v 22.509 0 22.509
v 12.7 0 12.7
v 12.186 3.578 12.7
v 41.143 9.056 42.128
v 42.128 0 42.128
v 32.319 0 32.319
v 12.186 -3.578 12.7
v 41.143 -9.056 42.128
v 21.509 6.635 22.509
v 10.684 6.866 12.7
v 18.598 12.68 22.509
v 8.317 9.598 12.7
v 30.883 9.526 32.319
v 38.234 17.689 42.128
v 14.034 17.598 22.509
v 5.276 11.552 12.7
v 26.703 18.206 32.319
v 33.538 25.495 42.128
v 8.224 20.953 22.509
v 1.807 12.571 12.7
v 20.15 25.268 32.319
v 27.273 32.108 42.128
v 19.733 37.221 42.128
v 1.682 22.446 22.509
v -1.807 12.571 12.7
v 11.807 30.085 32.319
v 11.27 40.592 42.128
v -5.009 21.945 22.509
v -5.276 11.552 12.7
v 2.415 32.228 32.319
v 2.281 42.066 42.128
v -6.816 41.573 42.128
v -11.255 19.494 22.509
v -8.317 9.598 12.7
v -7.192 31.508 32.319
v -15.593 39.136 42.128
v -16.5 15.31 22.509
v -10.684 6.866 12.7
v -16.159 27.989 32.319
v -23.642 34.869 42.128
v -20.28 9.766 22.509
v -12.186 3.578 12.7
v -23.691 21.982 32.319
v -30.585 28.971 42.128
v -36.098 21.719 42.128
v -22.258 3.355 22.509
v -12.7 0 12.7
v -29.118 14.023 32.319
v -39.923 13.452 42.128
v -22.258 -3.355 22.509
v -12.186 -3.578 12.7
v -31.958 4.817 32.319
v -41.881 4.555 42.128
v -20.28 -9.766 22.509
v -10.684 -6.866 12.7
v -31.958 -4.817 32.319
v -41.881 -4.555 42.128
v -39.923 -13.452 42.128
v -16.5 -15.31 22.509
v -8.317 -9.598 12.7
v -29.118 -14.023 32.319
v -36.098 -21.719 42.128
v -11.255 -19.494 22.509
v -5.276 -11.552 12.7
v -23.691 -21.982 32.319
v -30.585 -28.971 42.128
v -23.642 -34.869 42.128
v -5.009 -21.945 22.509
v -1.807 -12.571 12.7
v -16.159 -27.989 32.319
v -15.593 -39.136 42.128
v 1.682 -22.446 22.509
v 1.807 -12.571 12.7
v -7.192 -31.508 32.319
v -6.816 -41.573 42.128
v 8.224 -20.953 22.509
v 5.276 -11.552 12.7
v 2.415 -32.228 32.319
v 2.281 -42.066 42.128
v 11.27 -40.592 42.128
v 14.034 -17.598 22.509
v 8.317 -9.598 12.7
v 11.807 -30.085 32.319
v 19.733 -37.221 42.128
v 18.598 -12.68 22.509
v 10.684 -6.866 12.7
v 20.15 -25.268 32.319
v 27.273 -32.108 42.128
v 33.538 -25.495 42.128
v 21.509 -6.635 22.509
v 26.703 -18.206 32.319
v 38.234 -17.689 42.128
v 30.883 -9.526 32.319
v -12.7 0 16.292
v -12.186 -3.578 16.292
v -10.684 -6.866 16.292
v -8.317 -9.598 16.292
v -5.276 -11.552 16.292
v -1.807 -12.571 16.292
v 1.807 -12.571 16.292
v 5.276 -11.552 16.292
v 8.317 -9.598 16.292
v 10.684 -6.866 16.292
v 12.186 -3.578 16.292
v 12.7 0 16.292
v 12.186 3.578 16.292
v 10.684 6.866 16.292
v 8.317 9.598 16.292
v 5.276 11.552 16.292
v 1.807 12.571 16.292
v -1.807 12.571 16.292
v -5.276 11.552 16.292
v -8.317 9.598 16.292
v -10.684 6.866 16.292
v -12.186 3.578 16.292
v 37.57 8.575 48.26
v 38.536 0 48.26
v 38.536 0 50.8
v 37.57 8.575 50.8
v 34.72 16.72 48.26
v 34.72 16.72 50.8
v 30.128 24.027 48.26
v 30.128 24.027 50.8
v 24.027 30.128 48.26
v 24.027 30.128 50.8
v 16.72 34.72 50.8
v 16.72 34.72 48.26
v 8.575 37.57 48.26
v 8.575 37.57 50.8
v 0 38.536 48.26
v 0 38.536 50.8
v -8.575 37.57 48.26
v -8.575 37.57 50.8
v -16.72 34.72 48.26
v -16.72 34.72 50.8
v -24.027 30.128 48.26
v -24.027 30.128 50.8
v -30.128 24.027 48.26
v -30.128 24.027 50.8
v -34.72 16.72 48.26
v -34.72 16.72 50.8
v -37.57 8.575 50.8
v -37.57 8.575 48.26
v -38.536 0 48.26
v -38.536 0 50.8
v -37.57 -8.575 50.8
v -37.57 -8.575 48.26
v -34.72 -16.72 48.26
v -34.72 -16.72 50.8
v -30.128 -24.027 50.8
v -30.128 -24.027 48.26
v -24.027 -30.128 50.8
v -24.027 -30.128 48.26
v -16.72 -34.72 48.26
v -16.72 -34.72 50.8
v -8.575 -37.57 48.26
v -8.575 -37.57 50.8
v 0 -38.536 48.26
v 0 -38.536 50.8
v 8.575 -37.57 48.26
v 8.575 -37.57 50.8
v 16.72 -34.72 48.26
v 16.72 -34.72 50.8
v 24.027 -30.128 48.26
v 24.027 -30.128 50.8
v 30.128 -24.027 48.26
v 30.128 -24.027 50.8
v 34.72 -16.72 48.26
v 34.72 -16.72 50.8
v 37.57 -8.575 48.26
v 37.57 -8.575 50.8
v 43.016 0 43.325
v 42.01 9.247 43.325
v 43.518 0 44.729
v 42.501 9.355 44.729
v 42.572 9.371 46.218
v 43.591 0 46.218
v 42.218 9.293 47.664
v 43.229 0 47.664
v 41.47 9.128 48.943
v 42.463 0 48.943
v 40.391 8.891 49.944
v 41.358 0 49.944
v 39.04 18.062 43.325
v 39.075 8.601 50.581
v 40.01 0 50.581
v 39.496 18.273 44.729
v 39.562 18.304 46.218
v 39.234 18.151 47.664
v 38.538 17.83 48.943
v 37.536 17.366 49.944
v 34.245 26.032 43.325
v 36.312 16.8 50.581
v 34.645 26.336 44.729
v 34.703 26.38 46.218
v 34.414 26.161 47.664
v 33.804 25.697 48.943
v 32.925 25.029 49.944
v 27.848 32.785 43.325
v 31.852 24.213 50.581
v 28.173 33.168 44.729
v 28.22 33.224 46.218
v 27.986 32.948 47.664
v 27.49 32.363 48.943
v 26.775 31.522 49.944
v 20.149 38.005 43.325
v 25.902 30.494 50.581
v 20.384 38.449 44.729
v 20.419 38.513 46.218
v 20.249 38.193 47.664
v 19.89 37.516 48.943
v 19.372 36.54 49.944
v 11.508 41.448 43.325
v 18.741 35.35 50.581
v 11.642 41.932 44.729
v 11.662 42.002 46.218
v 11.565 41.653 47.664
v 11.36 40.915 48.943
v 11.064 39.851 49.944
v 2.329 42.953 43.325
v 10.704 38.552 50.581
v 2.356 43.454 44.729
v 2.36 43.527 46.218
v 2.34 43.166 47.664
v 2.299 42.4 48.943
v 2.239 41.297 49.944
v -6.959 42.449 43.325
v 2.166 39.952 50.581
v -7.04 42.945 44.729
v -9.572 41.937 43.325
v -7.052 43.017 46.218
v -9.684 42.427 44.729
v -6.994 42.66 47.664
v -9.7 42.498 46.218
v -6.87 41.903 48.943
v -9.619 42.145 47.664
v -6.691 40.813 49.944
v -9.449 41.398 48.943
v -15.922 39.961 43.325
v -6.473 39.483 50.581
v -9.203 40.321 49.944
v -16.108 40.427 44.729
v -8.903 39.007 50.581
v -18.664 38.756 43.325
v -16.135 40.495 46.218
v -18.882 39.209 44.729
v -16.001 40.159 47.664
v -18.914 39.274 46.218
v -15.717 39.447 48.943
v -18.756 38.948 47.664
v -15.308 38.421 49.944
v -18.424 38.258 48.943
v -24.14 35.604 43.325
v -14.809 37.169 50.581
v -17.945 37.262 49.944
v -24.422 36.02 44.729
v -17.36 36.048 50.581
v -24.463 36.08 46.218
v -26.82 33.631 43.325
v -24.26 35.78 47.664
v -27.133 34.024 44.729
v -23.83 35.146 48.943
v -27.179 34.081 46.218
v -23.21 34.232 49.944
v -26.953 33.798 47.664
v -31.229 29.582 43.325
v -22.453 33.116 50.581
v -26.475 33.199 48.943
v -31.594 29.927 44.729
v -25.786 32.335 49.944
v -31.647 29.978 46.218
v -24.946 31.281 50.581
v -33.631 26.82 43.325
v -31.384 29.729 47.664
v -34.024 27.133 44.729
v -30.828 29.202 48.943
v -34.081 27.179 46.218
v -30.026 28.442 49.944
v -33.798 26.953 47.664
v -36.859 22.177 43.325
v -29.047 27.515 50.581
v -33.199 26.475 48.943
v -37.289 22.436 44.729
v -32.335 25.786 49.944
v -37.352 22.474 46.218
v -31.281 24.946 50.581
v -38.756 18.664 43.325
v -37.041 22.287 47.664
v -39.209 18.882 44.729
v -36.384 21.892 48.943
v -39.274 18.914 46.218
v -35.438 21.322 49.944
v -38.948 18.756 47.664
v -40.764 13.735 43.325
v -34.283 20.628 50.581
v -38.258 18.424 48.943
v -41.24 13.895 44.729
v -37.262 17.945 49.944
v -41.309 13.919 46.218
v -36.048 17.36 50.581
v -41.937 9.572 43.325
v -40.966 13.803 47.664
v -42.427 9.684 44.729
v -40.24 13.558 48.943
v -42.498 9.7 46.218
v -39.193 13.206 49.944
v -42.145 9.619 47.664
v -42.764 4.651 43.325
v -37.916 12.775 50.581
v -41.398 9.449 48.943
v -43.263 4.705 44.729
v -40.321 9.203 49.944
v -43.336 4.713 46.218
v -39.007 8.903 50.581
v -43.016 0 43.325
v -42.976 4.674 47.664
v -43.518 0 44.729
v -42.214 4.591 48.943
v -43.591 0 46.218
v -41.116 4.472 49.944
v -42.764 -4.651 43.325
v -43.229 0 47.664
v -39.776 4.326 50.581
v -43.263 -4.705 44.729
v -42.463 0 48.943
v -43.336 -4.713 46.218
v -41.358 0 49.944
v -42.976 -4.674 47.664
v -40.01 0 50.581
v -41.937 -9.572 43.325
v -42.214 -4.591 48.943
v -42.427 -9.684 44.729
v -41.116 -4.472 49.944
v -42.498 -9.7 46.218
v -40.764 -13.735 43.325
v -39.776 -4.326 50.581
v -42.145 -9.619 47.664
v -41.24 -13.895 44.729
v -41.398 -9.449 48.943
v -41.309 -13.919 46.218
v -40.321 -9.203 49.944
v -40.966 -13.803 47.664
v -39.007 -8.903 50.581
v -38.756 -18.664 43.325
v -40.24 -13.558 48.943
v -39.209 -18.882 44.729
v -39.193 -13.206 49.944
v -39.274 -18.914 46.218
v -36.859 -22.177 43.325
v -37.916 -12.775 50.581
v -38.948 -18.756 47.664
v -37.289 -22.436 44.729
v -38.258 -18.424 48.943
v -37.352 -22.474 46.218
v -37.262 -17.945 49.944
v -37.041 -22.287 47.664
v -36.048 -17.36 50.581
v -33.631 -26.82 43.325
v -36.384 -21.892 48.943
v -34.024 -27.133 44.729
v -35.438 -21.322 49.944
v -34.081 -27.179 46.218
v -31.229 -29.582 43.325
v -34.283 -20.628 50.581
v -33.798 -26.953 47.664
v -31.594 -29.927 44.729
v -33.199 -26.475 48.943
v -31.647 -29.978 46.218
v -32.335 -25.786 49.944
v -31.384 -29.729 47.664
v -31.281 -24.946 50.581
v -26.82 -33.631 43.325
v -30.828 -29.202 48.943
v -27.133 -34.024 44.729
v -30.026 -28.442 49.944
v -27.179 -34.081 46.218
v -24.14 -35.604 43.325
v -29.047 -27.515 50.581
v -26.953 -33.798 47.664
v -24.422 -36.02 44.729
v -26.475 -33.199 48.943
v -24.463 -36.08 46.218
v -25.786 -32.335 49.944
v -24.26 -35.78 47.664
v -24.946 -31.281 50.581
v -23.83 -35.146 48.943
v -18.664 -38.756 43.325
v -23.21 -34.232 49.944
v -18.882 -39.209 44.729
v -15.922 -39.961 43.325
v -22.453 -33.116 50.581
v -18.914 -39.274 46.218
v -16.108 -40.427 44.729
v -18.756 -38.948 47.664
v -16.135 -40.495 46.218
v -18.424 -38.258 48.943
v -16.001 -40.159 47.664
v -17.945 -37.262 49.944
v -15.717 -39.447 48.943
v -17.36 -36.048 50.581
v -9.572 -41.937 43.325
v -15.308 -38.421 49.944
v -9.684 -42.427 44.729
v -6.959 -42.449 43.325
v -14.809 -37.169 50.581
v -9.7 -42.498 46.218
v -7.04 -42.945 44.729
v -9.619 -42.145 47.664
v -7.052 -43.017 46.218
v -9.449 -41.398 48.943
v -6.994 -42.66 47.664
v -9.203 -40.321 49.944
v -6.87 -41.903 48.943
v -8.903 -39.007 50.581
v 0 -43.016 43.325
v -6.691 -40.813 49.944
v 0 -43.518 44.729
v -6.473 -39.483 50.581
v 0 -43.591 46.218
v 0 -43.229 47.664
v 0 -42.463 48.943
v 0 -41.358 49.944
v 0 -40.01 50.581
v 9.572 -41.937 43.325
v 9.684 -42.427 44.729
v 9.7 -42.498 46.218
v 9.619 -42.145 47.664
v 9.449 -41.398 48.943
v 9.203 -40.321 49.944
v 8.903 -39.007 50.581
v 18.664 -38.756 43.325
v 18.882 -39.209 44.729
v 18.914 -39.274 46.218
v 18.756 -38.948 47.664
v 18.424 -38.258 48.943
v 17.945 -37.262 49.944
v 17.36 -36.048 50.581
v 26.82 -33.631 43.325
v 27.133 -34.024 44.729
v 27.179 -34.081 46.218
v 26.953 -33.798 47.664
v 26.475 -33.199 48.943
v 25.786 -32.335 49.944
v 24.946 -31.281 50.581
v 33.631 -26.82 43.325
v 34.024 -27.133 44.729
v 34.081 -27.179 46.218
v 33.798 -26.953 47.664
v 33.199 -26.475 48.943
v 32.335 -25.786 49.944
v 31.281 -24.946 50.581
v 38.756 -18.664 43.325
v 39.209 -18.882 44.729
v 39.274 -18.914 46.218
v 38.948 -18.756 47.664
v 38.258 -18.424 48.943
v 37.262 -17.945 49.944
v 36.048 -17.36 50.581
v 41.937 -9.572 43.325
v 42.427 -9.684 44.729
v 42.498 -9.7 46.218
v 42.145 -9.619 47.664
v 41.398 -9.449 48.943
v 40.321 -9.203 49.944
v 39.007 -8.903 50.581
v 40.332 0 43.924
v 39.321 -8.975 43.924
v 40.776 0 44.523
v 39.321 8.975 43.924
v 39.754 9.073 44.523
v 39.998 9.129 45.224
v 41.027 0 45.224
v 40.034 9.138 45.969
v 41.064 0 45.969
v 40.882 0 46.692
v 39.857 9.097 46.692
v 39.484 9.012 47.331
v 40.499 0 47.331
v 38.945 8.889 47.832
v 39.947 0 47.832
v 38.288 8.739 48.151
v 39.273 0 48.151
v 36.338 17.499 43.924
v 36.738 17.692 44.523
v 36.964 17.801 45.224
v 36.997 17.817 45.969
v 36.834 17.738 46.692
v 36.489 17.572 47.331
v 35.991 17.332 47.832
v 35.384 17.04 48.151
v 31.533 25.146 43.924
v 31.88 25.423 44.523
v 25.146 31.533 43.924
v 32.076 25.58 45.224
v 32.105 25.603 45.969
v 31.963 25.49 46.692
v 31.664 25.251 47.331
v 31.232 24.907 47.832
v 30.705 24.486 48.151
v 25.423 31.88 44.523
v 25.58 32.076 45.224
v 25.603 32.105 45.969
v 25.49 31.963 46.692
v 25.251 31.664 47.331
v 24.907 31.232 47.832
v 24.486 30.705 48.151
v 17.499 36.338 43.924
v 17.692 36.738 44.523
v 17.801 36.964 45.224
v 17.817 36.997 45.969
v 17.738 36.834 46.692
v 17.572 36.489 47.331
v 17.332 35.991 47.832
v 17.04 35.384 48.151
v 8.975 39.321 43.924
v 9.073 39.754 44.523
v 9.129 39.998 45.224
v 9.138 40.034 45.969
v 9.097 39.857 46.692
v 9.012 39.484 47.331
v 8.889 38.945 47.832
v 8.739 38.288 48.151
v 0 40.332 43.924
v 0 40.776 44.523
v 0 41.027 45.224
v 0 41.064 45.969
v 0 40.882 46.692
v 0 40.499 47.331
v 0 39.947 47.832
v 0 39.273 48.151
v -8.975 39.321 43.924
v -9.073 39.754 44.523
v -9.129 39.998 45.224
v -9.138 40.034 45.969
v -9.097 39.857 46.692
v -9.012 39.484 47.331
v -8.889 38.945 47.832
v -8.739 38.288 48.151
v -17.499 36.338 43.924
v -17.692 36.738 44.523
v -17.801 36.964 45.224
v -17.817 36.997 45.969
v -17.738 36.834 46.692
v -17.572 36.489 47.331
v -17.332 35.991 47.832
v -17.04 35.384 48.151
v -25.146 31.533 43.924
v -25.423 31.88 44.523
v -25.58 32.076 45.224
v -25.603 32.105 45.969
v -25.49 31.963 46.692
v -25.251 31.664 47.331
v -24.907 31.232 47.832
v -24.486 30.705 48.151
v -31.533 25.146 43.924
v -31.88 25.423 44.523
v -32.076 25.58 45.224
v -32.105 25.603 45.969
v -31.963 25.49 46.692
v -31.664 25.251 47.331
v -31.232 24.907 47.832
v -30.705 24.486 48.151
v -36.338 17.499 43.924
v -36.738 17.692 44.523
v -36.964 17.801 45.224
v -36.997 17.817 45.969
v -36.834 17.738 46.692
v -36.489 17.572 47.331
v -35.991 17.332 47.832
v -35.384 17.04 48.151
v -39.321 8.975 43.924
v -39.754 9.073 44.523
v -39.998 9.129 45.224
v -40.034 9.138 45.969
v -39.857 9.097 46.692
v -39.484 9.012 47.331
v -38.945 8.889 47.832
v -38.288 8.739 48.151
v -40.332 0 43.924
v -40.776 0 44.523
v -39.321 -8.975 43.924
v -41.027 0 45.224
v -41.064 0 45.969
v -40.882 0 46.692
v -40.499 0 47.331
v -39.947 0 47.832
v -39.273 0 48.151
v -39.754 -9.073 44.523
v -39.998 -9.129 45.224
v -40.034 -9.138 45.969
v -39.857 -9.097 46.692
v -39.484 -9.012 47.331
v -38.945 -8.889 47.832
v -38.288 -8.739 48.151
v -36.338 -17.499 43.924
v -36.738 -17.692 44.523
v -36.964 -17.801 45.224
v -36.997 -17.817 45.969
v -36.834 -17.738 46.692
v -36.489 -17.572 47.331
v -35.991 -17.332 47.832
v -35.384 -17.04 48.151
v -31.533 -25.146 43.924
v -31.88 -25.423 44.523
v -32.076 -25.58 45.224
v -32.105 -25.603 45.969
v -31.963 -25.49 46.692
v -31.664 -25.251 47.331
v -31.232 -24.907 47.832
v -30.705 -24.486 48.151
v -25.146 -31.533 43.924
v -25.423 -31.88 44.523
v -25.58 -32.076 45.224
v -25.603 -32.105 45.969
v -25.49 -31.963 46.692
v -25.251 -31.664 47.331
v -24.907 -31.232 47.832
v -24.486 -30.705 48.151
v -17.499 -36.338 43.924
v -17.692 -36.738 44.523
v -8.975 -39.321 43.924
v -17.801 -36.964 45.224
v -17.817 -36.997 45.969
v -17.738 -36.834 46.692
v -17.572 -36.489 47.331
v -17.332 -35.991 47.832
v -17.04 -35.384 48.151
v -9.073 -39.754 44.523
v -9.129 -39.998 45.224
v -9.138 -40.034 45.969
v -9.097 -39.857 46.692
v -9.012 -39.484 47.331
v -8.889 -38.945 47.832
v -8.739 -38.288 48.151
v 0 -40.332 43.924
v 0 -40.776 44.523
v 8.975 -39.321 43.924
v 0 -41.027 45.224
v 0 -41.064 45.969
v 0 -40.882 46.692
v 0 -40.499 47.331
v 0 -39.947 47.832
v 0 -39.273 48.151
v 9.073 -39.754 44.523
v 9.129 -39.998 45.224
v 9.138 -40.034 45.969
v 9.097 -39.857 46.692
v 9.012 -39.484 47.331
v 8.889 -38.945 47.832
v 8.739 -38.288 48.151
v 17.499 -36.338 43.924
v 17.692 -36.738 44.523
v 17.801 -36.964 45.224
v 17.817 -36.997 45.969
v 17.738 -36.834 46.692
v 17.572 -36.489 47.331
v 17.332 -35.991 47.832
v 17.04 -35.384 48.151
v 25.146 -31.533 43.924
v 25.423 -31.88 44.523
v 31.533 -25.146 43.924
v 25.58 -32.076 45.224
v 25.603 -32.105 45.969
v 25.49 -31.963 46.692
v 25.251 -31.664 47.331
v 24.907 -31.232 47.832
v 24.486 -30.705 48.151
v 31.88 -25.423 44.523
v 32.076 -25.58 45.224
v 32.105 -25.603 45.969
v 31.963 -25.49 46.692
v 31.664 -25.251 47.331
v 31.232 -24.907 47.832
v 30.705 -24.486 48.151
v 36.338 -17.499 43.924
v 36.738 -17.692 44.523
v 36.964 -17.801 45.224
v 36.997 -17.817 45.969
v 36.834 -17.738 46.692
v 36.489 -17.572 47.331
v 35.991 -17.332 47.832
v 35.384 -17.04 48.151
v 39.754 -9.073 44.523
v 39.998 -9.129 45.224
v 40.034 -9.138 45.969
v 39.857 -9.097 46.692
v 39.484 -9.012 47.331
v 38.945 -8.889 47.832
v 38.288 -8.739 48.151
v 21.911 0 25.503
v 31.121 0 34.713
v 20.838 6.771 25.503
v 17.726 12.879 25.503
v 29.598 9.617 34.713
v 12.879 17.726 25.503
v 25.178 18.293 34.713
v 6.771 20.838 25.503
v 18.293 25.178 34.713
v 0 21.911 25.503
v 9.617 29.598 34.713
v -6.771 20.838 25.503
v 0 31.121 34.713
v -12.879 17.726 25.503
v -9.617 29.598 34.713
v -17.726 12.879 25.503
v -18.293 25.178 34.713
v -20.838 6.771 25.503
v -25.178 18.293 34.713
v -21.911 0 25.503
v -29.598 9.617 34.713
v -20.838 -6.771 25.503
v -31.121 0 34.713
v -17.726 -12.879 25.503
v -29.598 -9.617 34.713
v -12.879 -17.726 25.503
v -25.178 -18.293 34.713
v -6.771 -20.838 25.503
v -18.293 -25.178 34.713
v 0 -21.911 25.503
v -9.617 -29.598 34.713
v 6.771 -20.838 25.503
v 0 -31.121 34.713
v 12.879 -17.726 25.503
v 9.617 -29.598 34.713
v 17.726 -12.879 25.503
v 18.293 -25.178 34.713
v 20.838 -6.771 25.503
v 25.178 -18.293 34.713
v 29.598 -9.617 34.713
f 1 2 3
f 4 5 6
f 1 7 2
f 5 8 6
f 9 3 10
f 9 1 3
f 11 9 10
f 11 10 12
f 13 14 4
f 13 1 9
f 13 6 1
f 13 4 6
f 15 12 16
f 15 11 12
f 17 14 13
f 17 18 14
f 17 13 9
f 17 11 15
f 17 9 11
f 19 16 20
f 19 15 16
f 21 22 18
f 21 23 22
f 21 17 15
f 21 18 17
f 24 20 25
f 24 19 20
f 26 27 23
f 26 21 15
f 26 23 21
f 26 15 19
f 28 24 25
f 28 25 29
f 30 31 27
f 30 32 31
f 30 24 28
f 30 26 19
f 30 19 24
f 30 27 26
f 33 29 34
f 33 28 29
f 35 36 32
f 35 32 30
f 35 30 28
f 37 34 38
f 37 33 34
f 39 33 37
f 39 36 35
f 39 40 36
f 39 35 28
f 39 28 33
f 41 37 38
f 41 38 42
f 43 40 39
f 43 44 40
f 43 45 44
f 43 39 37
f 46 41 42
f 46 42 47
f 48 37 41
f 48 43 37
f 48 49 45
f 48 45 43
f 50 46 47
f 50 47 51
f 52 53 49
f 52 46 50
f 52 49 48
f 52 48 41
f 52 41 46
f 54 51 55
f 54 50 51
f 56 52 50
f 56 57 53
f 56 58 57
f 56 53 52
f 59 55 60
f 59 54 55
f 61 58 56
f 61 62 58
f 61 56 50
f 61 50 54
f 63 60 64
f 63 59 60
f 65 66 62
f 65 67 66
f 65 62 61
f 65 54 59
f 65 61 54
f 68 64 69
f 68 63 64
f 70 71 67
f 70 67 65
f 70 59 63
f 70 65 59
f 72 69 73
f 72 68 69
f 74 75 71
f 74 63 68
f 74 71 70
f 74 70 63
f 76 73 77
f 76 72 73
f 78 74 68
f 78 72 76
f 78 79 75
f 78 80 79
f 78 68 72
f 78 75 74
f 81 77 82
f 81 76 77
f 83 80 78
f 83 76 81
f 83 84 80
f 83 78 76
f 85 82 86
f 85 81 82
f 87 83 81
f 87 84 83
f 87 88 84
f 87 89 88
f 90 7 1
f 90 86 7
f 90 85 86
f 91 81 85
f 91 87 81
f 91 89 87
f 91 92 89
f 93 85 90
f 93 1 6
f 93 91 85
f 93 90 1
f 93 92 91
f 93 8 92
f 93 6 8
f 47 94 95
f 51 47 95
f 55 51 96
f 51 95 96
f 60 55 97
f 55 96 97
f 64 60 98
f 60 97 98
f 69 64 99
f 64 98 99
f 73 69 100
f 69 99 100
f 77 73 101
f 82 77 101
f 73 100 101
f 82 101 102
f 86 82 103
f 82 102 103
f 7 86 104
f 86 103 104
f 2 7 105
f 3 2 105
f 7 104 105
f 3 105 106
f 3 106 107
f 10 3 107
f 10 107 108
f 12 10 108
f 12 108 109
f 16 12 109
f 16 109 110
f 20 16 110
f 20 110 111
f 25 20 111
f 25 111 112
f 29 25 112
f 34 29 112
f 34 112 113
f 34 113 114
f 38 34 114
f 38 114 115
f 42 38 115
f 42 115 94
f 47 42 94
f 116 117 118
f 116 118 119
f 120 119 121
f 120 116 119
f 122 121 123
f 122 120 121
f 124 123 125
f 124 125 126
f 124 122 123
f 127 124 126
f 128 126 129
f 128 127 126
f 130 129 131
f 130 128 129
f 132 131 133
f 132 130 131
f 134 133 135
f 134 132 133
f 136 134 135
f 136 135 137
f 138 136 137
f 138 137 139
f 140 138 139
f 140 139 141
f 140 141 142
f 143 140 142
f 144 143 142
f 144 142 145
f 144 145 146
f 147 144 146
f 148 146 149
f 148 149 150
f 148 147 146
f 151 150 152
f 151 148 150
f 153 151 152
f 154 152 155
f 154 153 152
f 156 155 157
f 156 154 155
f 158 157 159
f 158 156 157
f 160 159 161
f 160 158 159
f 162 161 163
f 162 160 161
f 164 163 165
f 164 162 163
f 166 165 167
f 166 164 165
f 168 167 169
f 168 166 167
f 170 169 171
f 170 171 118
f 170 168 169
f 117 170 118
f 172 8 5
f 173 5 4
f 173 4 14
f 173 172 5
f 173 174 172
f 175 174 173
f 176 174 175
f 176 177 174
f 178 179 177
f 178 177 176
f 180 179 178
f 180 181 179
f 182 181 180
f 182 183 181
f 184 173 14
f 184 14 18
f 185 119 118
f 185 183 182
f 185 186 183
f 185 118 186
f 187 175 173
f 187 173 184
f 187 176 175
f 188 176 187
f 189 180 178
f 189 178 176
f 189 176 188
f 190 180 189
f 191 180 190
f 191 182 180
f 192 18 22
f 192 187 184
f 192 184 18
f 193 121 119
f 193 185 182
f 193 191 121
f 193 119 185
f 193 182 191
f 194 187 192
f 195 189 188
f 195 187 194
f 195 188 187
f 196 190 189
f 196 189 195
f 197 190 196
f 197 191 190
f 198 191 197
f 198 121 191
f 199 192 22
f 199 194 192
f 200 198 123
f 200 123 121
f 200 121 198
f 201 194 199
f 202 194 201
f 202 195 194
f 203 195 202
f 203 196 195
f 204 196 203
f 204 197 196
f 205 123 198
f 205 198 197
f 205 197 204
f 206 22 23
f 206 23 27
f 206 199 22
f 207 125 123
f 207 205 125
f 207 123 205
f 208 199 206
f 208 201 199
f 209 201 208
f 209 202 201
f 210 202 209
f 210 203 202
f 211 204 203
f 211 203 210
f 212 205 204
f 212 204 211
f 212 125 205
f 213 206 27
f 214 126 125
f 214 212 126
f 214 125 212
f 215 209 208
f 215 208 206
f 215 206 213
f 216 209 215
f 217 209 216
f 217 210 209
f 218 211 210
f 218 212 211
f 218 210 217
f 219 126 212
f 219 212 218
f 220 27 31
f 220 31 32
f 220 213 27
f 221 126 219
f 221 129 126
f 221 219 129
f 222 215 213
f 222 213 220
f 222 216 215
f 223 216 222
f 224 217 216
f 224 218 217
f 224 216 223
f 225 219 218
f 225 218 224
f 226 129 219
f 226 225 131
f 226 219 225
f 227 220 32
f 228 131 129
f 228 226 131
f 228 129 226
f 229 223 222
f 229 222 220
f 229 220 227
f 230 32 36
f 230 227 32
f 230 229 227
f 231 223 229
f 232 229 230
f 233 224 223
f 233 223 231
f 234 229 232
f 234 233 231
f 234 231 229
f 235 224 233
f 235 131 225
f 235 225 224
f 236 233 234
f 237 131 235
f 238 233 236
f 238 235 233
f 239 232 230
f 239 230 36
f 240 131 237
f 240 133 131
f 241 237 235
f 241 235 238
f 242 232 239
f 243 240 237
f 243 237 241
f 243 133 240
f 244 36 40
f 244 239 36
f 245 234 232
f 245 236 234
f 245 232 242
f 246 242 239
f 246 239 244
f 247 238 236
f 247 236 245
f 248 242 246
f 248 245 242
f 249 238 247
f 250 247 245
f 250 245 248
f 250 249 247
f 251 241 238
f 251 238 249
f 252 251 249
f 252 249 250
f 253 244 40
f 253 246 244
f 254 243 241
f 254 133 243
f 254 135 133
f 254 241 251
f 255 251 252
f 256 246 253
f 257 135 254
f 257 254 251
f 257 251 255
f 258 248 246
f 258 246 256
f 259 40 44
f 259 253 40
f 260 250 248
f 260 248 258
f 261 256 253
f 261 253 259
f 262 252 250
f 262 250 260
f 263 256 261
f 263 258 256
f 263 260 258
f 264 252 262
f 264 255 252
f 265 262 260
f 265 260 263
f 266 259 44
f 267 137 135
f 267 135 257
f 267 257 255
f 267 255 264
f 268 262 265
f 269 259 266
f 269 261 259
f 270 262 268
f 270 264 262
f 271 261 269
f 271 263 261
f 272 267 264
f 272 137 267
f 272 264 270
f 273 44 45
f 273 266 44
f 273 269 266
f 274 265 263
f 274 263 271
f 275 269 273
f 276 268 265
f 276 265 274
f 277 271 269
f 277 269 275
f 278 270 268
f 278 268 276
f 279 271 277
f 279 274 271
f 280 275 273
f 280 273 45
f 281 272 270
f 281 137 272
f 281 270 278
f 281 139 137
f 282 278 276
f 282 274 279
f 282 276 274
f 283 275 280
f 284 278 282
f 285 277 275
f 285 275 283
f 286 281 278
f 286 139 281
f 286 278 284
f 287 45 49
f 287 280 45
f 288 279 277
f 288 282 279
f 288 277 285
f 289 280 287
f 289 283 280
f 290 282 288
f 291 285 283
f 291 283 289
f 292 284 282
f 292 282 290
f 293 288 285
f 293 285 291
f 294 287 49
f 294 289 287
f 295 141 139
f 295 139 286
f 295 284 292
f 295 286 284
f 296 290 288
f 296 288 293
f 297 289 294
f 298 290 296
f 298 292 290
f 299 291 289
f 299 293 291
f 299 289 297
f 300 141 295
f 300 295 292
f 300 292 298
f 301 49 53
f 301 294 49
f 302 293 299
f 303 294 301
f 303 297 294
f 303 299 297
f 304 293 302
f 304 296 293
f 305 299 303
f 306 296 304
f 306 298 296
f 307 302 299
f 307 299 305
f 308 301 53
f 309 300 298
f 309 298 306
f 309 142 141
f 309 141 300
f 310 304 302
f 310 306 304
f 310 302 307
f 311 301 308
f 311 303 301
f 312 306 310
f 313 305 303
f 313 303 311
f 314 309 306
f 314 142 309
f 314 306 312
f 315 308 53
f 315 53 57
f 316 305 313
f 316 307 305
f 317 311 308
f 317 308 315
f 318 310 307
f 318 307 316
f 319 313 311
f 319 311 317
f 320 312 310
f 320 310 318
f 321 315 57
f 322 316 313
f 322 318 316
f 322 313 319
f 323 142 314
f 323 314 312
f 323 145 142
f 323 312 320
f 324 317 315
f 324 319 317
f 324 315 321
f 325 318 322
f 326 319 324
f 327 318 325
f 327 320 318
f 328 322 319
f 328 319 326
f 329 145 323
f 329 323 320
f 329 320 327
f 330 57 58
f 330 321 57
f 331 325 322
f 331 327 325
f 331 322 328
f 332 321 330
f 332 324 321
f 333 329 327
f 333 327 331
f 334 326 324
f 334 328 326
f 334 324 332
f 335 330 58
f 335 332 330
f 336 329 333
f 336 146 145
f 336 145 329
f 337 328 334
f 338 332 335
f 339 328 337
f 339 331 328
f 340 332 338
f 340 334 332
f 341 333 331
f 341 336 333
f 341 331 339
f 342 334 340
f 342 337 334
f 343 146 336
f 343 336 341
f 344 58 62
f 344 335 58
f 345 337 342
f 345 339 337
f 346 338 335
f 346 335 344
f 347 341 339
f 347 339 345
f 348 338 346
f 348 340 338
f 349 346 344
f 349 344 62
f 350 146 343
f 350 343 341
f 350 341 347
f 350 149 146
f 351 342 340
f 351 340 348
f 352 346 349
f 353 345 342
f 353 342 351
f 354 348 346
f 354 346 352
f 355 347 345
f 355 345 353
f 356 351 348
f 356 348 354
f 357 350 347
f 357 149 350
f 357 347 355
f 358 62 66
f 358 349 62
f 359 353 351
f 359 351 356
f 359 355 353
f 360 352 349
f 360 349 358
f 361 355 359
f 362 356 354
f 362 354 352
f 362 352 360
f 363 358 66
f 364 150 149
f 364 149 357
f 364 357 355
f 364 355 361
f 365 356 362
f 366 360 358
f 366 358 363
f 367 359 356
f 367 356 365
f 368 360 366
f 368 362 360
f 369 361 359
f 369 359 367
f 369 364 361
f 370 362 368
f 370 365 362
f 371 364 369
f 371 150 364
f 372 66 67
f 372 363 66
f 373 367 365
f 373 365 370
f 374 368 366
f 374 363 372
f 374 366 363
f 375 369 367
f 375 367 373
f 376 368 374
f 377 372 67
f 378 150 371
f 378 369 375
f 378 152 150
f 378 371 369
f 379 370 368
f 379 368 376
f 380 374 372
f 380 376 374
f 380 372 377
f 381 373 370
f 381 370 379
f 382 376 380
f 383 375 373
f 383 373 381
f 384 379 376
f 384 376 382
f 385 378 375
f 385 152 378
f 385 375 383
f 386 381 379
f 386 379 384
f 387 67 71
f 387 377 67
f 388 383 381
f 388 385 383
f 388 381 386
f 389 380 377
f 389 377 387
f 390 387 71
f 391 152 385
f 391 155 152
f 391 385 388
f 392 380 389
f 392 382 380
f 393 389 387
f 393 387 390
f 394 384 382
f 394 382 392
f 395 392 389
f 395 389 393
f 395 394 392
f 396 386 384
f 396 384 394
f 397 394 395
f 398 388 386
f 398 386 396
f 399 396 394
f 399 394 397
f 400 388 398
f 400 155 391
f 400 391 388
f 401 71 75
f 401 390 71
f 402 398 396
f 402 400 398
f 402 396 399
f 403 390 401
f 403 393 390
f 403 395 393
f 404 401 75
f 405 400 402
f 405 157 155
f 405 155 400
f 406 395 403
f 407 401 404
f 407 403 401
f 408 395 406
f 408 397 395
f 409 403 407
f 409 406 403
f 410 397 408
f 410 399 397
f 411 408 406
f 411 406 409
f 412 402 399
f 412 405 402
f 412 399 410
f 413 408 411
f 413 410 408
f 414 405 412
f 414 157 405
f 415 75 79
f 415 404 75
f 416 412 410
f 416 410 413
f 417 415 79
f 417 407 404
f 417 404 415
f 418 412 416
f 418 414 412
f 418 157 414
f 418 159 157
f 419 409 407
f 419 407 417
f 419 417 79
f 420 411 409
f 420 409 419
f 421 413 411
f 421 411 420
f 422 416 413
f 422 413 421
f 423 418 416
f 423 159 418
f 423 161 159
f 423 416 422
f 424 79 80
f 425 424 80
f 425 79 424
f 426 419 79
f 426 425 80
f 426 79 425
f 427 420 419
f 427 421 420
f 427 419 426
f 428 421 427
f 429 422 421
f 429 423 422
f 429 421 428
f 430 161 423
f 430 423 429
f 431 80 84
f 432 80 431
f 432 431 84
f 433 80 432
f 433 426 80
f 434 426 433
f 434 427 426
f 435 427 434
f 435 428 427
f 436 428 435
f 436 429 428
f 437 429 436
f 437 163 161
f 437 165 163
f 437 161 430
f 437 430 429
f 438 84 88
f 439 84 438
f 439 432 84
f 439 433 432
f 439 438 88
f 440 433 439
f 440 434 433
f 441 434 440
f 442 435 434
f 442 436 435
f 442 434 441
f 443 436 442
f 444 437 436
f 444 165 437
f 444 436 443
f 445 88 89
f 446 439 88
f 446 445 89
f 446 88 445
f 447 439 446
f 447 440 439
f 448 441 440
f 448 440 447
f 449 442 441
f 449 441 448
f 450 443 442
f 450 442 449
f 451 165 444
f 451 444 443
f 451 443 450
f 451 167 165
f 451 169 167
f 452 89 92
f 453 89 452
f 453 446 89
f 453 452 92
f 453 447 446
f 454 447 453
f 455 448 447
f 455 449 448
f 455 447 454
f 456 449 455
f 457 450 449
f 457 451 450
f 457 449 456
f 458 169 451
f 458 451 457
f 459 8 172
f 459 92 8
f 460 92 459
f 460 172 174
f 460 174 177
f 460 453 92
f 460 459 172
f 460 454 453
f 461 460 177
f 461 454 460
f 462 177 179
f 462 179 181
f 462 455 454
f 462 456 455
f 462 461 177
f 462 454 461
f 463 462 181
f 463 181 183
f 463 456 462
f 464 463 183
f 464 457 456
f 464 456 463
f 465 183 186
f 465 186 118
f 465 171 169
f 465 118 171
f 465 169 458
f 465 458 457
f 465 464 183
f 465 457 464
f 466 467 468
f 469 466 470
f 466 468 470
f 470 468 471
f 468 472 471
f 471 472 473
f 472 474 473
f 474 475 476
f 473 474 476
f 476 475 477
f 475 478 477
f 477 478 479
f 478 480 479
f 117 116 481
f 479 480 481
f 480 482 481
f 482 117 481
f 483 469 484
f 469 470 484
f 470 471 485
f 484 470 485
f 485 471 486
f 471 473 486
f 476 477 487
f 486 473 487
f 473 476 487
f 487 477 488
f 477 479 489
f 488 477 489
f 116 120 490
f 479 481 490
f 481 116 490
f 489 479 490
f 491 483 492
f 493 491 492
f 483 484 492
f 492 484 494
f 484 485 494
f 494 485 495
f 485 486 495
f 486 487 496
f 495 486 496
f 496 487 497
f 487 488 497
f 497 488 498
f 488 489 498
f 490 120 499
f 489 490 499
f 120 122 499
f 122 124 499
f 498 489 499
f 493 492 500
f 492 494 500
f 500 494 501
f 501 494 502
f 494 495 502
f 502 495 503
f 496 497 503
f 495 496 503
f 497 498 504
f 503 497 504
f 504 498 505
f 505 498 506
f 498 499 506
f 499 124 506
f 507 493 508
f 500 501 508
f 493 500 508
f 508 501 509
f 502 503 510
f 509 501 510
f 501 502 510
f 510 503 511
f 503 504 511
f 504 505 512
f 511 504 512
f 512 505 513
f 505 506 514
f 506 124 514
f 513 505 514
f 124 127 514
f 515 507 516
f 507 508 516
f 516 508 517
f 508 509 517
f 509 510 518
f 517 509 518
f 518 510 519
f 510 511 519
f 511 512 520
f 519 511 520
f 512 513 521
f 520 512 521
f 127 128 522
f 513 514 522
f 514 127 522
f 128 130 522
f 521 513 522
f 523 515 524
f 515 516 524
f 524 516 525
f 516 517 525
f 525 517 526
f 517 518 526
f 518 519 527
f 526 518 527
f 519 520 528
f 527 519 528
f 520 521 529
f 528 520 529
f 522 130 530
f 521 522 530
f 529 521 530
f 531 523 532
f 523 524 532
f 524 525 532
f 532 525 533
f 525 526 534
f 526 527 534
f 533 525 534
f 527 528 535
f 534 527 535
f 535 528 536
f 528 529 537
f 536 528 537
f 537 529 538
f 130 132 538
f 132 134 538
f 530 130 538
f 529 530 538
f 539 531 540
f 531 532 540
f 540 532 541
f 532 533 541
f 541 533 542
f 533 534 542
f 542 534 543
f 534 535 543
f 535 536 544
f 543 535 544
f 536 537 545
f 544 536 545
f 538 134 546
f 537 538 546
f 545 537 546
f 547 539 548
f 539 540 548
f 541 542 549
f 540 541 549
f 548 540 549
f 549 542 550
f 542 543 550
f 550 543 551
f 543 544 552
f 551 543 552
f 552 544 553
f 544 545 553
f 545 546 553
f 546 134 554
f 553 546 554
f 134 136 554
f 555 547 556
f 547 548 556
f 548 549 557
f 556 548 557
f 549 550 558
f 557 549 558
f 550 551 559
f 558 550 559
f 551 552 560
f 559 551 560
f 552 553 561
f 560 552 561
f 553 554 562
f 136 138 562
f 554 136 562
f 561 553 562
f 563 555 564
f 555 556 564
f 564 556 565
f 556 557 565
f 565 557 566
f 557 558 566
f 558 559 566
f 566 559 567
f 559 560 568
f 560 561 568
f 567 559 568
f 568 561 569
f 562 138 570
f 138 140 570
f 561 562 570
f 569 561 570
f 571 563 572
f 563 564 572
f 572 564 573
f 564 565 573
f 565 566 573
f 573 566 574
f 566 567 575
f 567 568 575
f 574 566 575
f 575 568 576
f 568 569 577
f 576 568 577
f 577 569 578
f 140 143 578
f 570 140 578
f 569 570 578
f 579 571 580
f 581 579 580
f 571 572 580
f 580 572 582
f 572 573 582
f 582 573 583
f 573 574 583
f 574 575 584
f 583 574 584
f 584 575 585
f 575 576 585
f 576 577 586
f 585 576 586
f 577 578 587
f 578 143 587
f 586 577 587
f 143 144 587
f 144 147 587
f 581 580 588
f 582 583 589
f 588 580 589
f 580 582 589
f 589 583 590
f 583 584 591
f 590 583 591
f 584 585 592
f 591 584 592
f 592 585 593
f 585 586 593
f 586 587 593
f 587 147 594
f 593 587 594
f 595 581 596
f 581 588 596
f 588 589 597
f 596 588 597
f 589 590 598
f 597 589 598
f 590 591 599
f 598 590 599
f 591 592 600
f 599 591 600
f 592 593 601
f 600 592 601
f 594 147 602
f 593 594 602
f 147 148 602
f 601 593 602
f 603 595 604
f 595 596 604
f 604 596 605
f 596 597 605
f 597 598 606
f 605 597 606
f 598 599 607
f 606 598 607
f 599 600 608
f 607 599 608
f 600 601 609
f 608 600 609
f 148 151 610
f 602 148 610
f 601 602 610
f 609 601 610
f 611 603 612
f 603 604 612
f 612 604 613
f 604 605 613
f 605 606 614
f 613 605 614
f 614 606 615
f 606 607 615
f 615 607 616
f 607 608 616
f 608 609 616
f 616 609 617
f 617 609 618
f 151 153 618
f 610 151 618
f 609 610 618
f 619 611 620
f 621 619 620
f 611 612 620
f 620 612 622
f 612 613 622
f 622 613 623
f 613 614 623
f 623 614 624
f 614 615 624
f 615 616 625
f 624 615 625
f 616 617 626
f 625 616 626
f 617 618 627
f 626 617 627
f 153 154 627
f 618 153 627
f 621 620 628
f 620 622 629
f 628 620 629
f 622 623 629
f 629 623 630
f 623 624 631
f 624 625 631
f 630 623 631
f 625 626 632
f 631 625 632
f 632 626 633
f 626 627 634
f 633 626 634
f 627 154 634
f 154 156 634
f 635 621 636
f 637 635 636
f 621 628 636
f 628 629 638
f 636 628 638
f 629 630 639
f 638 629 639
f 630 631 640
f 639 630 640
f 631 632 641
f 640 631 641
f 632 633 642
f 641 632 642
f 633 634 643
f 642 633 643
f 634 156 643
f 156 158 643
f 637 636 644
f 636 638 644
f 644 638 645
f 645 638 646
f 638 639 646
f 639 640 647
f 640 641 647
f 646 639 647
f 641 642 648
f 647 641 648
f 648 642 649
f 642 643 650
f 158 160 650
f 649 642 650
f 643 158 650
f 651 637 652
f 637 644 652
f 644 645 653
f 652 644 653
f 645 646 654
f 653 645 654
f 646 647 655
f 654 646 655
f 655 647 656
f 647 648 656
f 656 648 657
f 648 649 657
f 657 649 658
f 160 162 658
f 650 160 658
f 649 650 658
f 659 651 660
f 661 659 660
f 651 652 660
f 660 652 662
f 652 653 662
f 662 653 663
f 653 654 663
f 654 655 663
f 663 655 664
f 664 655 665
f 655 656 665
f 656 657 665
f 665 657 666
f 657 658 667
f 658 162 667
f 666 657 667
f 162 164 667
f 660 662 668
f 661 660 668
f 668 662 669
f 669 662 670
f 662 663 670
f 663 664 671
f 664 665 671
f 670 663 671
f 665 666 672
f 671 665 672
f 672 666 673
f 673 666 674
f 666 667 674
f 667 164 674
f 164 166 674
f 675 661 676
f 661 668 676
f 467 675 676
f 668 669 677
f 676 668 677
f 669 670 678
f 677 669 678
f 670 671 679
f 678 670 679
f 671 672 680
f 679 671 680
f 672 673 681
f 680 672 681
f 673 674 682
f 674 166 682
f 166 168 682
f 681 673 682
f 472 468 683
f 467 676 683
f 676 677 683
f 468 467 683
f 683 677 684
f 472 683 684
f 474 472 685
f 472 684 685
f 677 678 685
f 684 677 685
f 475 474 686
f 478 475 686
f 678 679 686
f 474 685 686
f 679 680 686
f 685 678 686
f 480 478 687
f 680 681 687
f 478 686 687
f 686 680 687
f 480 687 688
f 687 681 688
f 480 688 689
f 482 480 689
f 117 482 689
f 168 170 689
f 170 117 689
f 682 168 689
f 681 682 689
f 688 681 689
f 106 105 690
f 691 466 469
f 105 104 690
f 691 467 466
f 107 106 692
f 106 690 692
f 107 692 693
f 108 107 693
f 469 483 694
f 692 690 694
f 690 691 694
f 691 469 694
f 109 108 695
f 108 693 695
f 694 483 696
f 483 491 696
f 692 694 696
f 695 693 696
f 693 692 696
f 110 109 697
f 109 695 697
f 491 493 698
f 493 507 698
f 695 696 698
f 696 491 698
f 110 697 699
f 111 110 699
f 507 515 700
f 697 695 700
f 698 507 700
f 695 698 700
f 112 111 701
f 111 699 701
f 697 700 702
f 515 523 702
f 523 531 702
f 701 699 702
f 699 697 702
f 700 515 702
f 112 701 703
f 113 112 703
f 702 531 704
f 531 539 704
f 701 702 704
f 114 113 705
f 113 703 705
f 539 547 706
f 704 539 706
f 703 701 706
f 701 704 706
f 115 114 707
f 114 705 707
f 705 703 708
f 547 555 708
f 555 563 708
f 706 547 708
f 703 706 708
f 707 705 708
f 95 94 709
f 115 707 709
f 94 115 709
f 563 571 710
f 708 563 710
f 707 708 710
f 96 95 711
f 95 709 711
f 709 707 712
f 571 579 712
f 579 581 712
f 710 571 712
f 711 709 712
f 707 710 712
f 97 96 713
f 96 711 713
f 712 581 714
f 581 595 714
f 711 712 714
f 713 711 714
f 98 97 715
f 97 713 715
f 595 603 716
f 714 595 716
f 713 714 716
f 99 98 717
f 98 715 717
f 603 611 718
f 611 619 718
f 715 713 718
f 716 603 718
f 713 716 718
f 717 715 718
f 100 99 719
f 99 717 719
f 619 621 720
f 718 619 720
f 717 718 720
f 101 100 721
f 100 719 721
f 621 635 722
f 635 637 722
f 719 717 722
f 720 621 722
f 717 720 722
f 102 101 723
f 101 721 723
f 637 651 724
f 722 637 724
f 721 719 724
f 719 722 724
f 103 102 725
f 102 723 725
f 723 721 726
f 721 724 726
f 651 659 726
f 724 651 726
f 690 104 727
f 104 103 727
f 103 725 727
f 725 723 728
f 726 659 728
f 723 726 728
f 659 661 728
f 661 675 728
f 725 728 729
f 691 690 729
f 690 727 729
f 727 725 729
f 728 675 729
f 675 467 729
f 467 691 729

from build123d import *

# Parameters (mm, degrees)
F2_R = 5.08
F3_T = -2.54
F5_D = 25.4


# Not quite as in the source:
# - a shell that OpenCascade refuses in one call is made with other operations: the cavity is built on its own and cut out


with BuildPart() as f1:
    # F0 (on Front) → F1 (revolve)
    with BuildSketch(Plane.XZ):
        Polygon((0, 50.8), (0, 0), (50.8, 50.8), align=None)
    revolve(axis=Axis((0, 0, 25.4), (0, 0, 1)))

    # F2
    f2_edges = [f1.edges().sort_by_distance(p)[0] for p in [
        (-50.8, 0, 50.8),
    ]]
    fillet(f2_edges, radius=F2_R)

    # F3: a shell. OpenCascade refuses it in one call, so the cavity is built on its own and cut out:
    # the body offset inwards by the wall thickness, plus a prism from it out through each open face.
    f3_core = offset(f1.part, amount=F3_T, mode=Mode.PRIVATE)
    f3_exits = [f3_core.faces().sort_by_distance(p)[0] for p in [
        (0, 0, 48.26),
    ]]
    add(f3_core, mode=Mode.SUBTRACT)
    extrude(f3_exits, amount=-F3_T, mode=Mode.SUBTRACT)

    # F5 (through all)
    with Locations(Plane(origin=(0, 0, 0), x_dir=(1, 0, 0), z_dir=(0, 0, -1))):
        with Locations((0, 0)):
            Hole(F5_D / 2)


solid = f1.part
